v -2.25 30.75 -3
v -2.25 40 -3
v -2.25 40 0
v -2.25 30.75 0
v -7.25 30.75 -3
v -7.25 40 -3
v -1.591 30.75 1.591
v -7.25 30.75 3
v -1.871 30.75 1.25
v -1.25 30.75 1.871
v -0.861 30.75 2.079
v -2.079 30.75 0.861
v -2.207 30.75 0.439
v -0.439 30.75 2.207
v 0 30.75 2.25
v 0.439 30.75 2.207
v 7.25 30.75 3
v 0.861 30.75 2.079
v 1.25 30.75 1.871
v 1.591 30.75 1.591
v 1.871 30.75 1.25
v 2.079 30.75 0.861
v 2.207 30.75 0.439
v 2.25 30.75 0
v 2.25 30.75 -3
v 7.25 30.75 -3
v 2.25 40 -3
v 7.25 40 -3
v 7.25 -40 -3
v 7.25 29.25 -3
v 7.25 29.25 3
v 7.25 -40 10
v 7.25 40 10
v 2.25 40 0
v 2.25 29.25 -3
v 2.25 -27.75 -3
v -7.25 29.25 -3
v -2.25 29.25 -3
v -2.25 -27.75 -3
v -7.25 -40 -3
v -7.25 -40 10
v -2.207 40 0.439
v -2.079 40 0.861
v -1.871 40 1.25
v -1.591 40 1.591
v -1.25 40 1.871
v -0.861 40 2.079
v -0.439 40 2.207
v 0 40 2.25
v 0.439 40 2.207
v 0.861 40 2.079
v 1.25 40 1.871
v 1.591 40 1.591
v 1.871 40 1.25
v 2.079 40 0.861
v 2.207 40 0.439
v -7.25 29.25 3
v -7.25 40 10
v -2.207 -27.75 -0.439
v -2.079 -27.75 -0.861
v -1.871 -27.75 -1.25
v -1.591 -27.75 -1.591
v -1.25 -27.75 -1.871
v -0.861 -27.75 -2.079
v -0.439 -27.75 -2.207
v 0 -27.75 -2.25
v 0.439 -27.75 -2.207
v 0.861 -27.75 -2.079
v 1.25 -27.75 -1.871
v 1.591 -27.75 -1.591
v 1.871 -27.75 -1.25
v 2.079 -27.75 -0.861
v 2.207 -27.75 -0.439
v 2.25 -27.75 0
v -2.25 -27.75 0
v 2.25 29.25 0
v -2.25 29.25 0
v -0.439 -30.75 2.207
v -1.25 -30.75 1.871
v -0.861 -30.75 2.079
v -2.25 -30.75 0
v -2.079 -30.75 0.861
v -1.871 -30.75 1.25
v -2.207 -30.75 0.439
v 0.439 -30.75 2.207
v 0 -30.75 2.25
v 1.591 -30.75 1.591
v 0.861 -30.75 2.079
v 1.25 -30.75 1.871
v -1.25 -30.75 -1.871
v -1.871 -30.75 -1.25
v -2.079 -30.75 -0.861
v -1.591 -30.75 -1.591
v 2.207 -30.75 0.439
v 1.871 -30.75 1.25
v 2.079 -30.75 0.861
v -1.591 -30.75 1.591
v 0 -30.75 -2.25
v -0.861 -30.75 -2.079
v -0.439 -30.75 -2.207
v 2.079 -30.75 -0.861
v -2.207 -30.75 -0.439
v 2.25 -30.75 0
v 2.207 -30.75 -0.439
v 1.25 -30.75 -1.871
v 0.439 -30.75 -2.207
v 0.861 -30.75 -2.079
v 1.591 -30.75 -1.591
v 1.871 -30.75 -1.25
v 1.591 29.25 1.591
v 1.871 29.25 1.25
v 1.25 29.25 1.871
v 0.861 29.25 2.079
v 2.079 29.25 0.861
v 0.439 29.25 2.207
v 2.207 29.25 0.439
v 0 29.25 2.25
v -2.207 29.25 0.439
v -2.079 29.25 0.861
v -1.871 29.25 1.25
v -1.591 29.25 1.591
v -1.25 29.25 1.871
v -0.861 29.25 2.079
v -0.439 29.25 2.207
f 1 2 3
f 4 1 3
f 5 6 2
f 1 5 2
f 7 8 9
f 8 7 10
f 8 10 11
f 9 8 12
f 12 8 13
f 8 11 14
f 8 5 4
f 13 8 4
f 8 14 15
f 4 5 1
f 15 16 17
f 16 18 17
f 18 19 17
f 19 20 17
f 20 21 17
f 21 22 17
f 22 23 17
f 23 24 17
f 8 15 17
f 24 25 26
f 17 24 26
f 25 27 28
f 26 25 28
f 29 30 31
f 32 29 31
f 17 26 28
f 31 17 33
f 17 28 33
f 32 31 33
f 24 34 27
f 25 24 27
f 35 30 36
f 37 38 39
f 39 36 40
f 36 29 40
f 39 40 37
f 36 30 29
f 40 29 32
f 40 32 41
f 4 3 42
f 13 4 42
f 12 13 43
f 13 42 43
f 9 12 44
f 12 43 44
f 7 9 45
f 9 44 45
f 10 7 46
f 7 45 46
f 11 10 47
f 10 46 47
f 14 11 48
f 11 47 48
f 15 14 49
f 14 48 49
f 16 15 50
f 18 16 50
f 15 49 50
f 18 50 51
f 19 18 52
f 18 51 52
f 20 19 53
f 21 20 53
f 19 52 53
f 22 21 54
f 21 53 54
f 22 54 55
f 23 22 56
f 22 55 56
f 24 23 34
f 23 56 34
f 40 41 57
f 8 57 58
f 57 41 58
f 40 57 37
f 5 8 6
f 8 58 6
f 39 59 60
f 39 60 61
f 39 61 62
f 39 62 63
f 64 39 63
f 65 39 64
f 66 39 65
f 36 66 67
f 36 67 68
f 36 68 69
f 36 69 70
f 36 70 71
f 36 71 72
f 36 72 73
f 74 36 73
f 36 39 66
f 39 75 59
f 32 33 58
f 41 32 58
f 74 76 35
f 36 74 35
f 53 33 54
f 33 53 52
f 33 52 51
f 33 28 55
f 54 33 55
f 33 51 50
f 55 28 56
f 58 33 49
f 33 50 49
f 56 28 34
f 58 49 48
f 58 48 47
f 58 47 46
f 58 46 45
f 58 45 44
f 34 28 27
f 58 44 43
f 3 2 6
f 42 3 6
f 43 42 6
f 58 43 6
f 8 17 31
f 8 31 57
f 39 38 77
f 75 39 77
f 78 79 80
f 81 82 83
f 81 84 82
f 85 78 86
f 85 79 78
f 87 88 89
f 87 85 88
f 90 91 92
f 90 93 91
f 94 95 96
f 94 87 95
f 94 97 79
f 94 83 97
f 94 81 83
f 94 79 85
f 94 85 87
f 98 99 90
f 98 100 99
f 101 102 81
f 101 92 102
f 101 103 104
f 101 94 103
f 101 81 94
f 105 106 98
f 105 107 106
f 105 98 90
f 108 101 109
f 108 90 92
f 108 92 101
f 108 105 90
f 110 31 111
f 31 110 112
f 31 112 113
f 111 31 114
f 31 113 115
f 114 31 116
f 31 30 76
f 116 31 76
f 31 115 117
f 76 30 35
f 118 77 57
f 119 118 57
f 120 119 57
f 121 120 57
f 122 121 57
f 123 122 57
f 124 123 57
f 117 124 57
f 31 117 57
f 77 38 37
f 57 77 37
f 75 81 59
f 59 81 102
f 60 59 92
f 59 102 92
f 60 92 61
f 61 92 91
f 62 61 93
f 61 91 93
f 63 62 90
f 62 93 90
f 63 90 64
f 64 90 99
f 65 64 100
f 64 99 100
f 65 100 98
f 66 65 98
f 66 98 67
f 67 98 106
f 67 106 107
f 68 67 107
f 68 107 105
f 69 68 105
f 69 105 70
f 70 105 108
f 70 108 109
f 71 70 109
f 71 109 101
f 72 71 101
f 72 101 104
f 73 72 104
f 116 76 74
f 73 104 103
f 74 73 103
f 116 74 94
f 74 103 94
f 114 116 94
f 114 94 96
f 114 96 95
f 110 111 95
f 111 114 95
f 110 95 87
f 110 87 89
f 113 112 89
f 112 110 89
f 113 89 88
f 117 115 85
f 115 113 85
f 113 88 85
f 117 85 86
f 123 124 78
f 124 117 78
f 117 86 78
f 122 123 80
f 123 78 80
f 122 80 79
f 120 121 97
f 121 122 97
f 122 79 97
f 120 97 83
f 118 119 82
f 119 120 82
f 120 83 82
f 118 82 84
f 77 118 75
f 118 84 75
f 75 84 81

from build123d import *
from build123d.topology import SkipClean

# Parameters (mm, degrees)
BOSS_EXTRUDE1_DEPTH = 40
SKETCH2_W           = 14.5
SKETCH2_H           = 1.5
CUT_EXTRUDE1_DEPTH  = 6
BOSS_EXTRUDE2_REACH = 44.68
SKETCH2_3_W         = 14.5
SKETCH2_3_H         = 9.25
BOSS_EXTRUDE3_START = 3
BOSS_EXTRUDE3_DEPTH = 3


with BuildPart() as part:
    # Sketch1 → Boss-Extrude1 (new, symmetric)
    with BuildSketch(Plane(origin=(0, 0, 0), x_dir=(1, 0, 0), z_dir=(0, 1, 0))):
        with BuildLine():
            Line((-7.25, 3), (-2.25, 3))
            Line((-2.25, 3), (-2.25, 0))
            ThreePointArc((-2.25, 0), (0, -2.25), (2.25, 0))
            Line((2.25, 0), (2.25, 3))
            Line((2.25, 3), (7.25, 3))
            Line((7.25, 3), (7.25, -10))
            Line((7.25, -10), (-7.25, -10))
            Line((-7.25, -10), (-7.25, 3))
        make_face()
    extrude(amount=BOSS_EXTRUDE1_DEPTH, both=True)

    # Sketch2 → Cut-Extrude1 (cut)
    with BuildSketch(Plane(origin=(0, 0, -3), x_dir=(-1, 0, 0), z_dir=(0, 0, -1))):
        with Locations((0, 30)):
            Rectangle(SKETCH2_W, SKETCH2_H)
    extrude(amount=-CUT_EXTRUDE1_DEPTH, mode=Mode.SUBTRACT)

    # Sketch2<3> → Boss-Extrude2 (add, up to next)
    with BuildSketch(Plane(origin=(0, 0, -3), x_dir=(-1, 0, 0), z_dir=(0, 0, -1)), mode=Mode.PRIVATE) as boss_extrude2_sk1:
        with Locations((0, -35.375)):
            Rectangle(SKETCH2_3_W, SKETCH2_3_H)
    boss_extrude2_tool1 = extrude(boss_extrude2_sk1.sketch, amount=-BOSS_EXTRUDE2_REACH, mode=Mode.PRIVATE) - part.part
    add(boss_extrude2_tool1.solids().sort_by_distance((0, -35.375, -3))[0])

    # Sketch3 → Boss-Extrude3 (add)
    with SkipClean():  # the faces are left unmerged after this step: merging them gives an invalid solid
        with BuildSketch(Plane(origin=(0, -30.75, 0), x_dir=(1, 0, 0), z_dir=(0, 1, 0)).offset(BOSS_EXTRUDE3_START)):
            with BuildLine():
                Line((2.25, 0), (2.25, 3))
                Line((2.25, 3), (-2.25, 3))
                Line((-2.25, 3), (-2.25, 0))
                ThreePointArc((-2.25, 0), (0, 2.25), (2.25, 0))
            make_face()
        extrude(amount=-BOSS_EXTRUDE3_DEPTH)


solid = part.part
